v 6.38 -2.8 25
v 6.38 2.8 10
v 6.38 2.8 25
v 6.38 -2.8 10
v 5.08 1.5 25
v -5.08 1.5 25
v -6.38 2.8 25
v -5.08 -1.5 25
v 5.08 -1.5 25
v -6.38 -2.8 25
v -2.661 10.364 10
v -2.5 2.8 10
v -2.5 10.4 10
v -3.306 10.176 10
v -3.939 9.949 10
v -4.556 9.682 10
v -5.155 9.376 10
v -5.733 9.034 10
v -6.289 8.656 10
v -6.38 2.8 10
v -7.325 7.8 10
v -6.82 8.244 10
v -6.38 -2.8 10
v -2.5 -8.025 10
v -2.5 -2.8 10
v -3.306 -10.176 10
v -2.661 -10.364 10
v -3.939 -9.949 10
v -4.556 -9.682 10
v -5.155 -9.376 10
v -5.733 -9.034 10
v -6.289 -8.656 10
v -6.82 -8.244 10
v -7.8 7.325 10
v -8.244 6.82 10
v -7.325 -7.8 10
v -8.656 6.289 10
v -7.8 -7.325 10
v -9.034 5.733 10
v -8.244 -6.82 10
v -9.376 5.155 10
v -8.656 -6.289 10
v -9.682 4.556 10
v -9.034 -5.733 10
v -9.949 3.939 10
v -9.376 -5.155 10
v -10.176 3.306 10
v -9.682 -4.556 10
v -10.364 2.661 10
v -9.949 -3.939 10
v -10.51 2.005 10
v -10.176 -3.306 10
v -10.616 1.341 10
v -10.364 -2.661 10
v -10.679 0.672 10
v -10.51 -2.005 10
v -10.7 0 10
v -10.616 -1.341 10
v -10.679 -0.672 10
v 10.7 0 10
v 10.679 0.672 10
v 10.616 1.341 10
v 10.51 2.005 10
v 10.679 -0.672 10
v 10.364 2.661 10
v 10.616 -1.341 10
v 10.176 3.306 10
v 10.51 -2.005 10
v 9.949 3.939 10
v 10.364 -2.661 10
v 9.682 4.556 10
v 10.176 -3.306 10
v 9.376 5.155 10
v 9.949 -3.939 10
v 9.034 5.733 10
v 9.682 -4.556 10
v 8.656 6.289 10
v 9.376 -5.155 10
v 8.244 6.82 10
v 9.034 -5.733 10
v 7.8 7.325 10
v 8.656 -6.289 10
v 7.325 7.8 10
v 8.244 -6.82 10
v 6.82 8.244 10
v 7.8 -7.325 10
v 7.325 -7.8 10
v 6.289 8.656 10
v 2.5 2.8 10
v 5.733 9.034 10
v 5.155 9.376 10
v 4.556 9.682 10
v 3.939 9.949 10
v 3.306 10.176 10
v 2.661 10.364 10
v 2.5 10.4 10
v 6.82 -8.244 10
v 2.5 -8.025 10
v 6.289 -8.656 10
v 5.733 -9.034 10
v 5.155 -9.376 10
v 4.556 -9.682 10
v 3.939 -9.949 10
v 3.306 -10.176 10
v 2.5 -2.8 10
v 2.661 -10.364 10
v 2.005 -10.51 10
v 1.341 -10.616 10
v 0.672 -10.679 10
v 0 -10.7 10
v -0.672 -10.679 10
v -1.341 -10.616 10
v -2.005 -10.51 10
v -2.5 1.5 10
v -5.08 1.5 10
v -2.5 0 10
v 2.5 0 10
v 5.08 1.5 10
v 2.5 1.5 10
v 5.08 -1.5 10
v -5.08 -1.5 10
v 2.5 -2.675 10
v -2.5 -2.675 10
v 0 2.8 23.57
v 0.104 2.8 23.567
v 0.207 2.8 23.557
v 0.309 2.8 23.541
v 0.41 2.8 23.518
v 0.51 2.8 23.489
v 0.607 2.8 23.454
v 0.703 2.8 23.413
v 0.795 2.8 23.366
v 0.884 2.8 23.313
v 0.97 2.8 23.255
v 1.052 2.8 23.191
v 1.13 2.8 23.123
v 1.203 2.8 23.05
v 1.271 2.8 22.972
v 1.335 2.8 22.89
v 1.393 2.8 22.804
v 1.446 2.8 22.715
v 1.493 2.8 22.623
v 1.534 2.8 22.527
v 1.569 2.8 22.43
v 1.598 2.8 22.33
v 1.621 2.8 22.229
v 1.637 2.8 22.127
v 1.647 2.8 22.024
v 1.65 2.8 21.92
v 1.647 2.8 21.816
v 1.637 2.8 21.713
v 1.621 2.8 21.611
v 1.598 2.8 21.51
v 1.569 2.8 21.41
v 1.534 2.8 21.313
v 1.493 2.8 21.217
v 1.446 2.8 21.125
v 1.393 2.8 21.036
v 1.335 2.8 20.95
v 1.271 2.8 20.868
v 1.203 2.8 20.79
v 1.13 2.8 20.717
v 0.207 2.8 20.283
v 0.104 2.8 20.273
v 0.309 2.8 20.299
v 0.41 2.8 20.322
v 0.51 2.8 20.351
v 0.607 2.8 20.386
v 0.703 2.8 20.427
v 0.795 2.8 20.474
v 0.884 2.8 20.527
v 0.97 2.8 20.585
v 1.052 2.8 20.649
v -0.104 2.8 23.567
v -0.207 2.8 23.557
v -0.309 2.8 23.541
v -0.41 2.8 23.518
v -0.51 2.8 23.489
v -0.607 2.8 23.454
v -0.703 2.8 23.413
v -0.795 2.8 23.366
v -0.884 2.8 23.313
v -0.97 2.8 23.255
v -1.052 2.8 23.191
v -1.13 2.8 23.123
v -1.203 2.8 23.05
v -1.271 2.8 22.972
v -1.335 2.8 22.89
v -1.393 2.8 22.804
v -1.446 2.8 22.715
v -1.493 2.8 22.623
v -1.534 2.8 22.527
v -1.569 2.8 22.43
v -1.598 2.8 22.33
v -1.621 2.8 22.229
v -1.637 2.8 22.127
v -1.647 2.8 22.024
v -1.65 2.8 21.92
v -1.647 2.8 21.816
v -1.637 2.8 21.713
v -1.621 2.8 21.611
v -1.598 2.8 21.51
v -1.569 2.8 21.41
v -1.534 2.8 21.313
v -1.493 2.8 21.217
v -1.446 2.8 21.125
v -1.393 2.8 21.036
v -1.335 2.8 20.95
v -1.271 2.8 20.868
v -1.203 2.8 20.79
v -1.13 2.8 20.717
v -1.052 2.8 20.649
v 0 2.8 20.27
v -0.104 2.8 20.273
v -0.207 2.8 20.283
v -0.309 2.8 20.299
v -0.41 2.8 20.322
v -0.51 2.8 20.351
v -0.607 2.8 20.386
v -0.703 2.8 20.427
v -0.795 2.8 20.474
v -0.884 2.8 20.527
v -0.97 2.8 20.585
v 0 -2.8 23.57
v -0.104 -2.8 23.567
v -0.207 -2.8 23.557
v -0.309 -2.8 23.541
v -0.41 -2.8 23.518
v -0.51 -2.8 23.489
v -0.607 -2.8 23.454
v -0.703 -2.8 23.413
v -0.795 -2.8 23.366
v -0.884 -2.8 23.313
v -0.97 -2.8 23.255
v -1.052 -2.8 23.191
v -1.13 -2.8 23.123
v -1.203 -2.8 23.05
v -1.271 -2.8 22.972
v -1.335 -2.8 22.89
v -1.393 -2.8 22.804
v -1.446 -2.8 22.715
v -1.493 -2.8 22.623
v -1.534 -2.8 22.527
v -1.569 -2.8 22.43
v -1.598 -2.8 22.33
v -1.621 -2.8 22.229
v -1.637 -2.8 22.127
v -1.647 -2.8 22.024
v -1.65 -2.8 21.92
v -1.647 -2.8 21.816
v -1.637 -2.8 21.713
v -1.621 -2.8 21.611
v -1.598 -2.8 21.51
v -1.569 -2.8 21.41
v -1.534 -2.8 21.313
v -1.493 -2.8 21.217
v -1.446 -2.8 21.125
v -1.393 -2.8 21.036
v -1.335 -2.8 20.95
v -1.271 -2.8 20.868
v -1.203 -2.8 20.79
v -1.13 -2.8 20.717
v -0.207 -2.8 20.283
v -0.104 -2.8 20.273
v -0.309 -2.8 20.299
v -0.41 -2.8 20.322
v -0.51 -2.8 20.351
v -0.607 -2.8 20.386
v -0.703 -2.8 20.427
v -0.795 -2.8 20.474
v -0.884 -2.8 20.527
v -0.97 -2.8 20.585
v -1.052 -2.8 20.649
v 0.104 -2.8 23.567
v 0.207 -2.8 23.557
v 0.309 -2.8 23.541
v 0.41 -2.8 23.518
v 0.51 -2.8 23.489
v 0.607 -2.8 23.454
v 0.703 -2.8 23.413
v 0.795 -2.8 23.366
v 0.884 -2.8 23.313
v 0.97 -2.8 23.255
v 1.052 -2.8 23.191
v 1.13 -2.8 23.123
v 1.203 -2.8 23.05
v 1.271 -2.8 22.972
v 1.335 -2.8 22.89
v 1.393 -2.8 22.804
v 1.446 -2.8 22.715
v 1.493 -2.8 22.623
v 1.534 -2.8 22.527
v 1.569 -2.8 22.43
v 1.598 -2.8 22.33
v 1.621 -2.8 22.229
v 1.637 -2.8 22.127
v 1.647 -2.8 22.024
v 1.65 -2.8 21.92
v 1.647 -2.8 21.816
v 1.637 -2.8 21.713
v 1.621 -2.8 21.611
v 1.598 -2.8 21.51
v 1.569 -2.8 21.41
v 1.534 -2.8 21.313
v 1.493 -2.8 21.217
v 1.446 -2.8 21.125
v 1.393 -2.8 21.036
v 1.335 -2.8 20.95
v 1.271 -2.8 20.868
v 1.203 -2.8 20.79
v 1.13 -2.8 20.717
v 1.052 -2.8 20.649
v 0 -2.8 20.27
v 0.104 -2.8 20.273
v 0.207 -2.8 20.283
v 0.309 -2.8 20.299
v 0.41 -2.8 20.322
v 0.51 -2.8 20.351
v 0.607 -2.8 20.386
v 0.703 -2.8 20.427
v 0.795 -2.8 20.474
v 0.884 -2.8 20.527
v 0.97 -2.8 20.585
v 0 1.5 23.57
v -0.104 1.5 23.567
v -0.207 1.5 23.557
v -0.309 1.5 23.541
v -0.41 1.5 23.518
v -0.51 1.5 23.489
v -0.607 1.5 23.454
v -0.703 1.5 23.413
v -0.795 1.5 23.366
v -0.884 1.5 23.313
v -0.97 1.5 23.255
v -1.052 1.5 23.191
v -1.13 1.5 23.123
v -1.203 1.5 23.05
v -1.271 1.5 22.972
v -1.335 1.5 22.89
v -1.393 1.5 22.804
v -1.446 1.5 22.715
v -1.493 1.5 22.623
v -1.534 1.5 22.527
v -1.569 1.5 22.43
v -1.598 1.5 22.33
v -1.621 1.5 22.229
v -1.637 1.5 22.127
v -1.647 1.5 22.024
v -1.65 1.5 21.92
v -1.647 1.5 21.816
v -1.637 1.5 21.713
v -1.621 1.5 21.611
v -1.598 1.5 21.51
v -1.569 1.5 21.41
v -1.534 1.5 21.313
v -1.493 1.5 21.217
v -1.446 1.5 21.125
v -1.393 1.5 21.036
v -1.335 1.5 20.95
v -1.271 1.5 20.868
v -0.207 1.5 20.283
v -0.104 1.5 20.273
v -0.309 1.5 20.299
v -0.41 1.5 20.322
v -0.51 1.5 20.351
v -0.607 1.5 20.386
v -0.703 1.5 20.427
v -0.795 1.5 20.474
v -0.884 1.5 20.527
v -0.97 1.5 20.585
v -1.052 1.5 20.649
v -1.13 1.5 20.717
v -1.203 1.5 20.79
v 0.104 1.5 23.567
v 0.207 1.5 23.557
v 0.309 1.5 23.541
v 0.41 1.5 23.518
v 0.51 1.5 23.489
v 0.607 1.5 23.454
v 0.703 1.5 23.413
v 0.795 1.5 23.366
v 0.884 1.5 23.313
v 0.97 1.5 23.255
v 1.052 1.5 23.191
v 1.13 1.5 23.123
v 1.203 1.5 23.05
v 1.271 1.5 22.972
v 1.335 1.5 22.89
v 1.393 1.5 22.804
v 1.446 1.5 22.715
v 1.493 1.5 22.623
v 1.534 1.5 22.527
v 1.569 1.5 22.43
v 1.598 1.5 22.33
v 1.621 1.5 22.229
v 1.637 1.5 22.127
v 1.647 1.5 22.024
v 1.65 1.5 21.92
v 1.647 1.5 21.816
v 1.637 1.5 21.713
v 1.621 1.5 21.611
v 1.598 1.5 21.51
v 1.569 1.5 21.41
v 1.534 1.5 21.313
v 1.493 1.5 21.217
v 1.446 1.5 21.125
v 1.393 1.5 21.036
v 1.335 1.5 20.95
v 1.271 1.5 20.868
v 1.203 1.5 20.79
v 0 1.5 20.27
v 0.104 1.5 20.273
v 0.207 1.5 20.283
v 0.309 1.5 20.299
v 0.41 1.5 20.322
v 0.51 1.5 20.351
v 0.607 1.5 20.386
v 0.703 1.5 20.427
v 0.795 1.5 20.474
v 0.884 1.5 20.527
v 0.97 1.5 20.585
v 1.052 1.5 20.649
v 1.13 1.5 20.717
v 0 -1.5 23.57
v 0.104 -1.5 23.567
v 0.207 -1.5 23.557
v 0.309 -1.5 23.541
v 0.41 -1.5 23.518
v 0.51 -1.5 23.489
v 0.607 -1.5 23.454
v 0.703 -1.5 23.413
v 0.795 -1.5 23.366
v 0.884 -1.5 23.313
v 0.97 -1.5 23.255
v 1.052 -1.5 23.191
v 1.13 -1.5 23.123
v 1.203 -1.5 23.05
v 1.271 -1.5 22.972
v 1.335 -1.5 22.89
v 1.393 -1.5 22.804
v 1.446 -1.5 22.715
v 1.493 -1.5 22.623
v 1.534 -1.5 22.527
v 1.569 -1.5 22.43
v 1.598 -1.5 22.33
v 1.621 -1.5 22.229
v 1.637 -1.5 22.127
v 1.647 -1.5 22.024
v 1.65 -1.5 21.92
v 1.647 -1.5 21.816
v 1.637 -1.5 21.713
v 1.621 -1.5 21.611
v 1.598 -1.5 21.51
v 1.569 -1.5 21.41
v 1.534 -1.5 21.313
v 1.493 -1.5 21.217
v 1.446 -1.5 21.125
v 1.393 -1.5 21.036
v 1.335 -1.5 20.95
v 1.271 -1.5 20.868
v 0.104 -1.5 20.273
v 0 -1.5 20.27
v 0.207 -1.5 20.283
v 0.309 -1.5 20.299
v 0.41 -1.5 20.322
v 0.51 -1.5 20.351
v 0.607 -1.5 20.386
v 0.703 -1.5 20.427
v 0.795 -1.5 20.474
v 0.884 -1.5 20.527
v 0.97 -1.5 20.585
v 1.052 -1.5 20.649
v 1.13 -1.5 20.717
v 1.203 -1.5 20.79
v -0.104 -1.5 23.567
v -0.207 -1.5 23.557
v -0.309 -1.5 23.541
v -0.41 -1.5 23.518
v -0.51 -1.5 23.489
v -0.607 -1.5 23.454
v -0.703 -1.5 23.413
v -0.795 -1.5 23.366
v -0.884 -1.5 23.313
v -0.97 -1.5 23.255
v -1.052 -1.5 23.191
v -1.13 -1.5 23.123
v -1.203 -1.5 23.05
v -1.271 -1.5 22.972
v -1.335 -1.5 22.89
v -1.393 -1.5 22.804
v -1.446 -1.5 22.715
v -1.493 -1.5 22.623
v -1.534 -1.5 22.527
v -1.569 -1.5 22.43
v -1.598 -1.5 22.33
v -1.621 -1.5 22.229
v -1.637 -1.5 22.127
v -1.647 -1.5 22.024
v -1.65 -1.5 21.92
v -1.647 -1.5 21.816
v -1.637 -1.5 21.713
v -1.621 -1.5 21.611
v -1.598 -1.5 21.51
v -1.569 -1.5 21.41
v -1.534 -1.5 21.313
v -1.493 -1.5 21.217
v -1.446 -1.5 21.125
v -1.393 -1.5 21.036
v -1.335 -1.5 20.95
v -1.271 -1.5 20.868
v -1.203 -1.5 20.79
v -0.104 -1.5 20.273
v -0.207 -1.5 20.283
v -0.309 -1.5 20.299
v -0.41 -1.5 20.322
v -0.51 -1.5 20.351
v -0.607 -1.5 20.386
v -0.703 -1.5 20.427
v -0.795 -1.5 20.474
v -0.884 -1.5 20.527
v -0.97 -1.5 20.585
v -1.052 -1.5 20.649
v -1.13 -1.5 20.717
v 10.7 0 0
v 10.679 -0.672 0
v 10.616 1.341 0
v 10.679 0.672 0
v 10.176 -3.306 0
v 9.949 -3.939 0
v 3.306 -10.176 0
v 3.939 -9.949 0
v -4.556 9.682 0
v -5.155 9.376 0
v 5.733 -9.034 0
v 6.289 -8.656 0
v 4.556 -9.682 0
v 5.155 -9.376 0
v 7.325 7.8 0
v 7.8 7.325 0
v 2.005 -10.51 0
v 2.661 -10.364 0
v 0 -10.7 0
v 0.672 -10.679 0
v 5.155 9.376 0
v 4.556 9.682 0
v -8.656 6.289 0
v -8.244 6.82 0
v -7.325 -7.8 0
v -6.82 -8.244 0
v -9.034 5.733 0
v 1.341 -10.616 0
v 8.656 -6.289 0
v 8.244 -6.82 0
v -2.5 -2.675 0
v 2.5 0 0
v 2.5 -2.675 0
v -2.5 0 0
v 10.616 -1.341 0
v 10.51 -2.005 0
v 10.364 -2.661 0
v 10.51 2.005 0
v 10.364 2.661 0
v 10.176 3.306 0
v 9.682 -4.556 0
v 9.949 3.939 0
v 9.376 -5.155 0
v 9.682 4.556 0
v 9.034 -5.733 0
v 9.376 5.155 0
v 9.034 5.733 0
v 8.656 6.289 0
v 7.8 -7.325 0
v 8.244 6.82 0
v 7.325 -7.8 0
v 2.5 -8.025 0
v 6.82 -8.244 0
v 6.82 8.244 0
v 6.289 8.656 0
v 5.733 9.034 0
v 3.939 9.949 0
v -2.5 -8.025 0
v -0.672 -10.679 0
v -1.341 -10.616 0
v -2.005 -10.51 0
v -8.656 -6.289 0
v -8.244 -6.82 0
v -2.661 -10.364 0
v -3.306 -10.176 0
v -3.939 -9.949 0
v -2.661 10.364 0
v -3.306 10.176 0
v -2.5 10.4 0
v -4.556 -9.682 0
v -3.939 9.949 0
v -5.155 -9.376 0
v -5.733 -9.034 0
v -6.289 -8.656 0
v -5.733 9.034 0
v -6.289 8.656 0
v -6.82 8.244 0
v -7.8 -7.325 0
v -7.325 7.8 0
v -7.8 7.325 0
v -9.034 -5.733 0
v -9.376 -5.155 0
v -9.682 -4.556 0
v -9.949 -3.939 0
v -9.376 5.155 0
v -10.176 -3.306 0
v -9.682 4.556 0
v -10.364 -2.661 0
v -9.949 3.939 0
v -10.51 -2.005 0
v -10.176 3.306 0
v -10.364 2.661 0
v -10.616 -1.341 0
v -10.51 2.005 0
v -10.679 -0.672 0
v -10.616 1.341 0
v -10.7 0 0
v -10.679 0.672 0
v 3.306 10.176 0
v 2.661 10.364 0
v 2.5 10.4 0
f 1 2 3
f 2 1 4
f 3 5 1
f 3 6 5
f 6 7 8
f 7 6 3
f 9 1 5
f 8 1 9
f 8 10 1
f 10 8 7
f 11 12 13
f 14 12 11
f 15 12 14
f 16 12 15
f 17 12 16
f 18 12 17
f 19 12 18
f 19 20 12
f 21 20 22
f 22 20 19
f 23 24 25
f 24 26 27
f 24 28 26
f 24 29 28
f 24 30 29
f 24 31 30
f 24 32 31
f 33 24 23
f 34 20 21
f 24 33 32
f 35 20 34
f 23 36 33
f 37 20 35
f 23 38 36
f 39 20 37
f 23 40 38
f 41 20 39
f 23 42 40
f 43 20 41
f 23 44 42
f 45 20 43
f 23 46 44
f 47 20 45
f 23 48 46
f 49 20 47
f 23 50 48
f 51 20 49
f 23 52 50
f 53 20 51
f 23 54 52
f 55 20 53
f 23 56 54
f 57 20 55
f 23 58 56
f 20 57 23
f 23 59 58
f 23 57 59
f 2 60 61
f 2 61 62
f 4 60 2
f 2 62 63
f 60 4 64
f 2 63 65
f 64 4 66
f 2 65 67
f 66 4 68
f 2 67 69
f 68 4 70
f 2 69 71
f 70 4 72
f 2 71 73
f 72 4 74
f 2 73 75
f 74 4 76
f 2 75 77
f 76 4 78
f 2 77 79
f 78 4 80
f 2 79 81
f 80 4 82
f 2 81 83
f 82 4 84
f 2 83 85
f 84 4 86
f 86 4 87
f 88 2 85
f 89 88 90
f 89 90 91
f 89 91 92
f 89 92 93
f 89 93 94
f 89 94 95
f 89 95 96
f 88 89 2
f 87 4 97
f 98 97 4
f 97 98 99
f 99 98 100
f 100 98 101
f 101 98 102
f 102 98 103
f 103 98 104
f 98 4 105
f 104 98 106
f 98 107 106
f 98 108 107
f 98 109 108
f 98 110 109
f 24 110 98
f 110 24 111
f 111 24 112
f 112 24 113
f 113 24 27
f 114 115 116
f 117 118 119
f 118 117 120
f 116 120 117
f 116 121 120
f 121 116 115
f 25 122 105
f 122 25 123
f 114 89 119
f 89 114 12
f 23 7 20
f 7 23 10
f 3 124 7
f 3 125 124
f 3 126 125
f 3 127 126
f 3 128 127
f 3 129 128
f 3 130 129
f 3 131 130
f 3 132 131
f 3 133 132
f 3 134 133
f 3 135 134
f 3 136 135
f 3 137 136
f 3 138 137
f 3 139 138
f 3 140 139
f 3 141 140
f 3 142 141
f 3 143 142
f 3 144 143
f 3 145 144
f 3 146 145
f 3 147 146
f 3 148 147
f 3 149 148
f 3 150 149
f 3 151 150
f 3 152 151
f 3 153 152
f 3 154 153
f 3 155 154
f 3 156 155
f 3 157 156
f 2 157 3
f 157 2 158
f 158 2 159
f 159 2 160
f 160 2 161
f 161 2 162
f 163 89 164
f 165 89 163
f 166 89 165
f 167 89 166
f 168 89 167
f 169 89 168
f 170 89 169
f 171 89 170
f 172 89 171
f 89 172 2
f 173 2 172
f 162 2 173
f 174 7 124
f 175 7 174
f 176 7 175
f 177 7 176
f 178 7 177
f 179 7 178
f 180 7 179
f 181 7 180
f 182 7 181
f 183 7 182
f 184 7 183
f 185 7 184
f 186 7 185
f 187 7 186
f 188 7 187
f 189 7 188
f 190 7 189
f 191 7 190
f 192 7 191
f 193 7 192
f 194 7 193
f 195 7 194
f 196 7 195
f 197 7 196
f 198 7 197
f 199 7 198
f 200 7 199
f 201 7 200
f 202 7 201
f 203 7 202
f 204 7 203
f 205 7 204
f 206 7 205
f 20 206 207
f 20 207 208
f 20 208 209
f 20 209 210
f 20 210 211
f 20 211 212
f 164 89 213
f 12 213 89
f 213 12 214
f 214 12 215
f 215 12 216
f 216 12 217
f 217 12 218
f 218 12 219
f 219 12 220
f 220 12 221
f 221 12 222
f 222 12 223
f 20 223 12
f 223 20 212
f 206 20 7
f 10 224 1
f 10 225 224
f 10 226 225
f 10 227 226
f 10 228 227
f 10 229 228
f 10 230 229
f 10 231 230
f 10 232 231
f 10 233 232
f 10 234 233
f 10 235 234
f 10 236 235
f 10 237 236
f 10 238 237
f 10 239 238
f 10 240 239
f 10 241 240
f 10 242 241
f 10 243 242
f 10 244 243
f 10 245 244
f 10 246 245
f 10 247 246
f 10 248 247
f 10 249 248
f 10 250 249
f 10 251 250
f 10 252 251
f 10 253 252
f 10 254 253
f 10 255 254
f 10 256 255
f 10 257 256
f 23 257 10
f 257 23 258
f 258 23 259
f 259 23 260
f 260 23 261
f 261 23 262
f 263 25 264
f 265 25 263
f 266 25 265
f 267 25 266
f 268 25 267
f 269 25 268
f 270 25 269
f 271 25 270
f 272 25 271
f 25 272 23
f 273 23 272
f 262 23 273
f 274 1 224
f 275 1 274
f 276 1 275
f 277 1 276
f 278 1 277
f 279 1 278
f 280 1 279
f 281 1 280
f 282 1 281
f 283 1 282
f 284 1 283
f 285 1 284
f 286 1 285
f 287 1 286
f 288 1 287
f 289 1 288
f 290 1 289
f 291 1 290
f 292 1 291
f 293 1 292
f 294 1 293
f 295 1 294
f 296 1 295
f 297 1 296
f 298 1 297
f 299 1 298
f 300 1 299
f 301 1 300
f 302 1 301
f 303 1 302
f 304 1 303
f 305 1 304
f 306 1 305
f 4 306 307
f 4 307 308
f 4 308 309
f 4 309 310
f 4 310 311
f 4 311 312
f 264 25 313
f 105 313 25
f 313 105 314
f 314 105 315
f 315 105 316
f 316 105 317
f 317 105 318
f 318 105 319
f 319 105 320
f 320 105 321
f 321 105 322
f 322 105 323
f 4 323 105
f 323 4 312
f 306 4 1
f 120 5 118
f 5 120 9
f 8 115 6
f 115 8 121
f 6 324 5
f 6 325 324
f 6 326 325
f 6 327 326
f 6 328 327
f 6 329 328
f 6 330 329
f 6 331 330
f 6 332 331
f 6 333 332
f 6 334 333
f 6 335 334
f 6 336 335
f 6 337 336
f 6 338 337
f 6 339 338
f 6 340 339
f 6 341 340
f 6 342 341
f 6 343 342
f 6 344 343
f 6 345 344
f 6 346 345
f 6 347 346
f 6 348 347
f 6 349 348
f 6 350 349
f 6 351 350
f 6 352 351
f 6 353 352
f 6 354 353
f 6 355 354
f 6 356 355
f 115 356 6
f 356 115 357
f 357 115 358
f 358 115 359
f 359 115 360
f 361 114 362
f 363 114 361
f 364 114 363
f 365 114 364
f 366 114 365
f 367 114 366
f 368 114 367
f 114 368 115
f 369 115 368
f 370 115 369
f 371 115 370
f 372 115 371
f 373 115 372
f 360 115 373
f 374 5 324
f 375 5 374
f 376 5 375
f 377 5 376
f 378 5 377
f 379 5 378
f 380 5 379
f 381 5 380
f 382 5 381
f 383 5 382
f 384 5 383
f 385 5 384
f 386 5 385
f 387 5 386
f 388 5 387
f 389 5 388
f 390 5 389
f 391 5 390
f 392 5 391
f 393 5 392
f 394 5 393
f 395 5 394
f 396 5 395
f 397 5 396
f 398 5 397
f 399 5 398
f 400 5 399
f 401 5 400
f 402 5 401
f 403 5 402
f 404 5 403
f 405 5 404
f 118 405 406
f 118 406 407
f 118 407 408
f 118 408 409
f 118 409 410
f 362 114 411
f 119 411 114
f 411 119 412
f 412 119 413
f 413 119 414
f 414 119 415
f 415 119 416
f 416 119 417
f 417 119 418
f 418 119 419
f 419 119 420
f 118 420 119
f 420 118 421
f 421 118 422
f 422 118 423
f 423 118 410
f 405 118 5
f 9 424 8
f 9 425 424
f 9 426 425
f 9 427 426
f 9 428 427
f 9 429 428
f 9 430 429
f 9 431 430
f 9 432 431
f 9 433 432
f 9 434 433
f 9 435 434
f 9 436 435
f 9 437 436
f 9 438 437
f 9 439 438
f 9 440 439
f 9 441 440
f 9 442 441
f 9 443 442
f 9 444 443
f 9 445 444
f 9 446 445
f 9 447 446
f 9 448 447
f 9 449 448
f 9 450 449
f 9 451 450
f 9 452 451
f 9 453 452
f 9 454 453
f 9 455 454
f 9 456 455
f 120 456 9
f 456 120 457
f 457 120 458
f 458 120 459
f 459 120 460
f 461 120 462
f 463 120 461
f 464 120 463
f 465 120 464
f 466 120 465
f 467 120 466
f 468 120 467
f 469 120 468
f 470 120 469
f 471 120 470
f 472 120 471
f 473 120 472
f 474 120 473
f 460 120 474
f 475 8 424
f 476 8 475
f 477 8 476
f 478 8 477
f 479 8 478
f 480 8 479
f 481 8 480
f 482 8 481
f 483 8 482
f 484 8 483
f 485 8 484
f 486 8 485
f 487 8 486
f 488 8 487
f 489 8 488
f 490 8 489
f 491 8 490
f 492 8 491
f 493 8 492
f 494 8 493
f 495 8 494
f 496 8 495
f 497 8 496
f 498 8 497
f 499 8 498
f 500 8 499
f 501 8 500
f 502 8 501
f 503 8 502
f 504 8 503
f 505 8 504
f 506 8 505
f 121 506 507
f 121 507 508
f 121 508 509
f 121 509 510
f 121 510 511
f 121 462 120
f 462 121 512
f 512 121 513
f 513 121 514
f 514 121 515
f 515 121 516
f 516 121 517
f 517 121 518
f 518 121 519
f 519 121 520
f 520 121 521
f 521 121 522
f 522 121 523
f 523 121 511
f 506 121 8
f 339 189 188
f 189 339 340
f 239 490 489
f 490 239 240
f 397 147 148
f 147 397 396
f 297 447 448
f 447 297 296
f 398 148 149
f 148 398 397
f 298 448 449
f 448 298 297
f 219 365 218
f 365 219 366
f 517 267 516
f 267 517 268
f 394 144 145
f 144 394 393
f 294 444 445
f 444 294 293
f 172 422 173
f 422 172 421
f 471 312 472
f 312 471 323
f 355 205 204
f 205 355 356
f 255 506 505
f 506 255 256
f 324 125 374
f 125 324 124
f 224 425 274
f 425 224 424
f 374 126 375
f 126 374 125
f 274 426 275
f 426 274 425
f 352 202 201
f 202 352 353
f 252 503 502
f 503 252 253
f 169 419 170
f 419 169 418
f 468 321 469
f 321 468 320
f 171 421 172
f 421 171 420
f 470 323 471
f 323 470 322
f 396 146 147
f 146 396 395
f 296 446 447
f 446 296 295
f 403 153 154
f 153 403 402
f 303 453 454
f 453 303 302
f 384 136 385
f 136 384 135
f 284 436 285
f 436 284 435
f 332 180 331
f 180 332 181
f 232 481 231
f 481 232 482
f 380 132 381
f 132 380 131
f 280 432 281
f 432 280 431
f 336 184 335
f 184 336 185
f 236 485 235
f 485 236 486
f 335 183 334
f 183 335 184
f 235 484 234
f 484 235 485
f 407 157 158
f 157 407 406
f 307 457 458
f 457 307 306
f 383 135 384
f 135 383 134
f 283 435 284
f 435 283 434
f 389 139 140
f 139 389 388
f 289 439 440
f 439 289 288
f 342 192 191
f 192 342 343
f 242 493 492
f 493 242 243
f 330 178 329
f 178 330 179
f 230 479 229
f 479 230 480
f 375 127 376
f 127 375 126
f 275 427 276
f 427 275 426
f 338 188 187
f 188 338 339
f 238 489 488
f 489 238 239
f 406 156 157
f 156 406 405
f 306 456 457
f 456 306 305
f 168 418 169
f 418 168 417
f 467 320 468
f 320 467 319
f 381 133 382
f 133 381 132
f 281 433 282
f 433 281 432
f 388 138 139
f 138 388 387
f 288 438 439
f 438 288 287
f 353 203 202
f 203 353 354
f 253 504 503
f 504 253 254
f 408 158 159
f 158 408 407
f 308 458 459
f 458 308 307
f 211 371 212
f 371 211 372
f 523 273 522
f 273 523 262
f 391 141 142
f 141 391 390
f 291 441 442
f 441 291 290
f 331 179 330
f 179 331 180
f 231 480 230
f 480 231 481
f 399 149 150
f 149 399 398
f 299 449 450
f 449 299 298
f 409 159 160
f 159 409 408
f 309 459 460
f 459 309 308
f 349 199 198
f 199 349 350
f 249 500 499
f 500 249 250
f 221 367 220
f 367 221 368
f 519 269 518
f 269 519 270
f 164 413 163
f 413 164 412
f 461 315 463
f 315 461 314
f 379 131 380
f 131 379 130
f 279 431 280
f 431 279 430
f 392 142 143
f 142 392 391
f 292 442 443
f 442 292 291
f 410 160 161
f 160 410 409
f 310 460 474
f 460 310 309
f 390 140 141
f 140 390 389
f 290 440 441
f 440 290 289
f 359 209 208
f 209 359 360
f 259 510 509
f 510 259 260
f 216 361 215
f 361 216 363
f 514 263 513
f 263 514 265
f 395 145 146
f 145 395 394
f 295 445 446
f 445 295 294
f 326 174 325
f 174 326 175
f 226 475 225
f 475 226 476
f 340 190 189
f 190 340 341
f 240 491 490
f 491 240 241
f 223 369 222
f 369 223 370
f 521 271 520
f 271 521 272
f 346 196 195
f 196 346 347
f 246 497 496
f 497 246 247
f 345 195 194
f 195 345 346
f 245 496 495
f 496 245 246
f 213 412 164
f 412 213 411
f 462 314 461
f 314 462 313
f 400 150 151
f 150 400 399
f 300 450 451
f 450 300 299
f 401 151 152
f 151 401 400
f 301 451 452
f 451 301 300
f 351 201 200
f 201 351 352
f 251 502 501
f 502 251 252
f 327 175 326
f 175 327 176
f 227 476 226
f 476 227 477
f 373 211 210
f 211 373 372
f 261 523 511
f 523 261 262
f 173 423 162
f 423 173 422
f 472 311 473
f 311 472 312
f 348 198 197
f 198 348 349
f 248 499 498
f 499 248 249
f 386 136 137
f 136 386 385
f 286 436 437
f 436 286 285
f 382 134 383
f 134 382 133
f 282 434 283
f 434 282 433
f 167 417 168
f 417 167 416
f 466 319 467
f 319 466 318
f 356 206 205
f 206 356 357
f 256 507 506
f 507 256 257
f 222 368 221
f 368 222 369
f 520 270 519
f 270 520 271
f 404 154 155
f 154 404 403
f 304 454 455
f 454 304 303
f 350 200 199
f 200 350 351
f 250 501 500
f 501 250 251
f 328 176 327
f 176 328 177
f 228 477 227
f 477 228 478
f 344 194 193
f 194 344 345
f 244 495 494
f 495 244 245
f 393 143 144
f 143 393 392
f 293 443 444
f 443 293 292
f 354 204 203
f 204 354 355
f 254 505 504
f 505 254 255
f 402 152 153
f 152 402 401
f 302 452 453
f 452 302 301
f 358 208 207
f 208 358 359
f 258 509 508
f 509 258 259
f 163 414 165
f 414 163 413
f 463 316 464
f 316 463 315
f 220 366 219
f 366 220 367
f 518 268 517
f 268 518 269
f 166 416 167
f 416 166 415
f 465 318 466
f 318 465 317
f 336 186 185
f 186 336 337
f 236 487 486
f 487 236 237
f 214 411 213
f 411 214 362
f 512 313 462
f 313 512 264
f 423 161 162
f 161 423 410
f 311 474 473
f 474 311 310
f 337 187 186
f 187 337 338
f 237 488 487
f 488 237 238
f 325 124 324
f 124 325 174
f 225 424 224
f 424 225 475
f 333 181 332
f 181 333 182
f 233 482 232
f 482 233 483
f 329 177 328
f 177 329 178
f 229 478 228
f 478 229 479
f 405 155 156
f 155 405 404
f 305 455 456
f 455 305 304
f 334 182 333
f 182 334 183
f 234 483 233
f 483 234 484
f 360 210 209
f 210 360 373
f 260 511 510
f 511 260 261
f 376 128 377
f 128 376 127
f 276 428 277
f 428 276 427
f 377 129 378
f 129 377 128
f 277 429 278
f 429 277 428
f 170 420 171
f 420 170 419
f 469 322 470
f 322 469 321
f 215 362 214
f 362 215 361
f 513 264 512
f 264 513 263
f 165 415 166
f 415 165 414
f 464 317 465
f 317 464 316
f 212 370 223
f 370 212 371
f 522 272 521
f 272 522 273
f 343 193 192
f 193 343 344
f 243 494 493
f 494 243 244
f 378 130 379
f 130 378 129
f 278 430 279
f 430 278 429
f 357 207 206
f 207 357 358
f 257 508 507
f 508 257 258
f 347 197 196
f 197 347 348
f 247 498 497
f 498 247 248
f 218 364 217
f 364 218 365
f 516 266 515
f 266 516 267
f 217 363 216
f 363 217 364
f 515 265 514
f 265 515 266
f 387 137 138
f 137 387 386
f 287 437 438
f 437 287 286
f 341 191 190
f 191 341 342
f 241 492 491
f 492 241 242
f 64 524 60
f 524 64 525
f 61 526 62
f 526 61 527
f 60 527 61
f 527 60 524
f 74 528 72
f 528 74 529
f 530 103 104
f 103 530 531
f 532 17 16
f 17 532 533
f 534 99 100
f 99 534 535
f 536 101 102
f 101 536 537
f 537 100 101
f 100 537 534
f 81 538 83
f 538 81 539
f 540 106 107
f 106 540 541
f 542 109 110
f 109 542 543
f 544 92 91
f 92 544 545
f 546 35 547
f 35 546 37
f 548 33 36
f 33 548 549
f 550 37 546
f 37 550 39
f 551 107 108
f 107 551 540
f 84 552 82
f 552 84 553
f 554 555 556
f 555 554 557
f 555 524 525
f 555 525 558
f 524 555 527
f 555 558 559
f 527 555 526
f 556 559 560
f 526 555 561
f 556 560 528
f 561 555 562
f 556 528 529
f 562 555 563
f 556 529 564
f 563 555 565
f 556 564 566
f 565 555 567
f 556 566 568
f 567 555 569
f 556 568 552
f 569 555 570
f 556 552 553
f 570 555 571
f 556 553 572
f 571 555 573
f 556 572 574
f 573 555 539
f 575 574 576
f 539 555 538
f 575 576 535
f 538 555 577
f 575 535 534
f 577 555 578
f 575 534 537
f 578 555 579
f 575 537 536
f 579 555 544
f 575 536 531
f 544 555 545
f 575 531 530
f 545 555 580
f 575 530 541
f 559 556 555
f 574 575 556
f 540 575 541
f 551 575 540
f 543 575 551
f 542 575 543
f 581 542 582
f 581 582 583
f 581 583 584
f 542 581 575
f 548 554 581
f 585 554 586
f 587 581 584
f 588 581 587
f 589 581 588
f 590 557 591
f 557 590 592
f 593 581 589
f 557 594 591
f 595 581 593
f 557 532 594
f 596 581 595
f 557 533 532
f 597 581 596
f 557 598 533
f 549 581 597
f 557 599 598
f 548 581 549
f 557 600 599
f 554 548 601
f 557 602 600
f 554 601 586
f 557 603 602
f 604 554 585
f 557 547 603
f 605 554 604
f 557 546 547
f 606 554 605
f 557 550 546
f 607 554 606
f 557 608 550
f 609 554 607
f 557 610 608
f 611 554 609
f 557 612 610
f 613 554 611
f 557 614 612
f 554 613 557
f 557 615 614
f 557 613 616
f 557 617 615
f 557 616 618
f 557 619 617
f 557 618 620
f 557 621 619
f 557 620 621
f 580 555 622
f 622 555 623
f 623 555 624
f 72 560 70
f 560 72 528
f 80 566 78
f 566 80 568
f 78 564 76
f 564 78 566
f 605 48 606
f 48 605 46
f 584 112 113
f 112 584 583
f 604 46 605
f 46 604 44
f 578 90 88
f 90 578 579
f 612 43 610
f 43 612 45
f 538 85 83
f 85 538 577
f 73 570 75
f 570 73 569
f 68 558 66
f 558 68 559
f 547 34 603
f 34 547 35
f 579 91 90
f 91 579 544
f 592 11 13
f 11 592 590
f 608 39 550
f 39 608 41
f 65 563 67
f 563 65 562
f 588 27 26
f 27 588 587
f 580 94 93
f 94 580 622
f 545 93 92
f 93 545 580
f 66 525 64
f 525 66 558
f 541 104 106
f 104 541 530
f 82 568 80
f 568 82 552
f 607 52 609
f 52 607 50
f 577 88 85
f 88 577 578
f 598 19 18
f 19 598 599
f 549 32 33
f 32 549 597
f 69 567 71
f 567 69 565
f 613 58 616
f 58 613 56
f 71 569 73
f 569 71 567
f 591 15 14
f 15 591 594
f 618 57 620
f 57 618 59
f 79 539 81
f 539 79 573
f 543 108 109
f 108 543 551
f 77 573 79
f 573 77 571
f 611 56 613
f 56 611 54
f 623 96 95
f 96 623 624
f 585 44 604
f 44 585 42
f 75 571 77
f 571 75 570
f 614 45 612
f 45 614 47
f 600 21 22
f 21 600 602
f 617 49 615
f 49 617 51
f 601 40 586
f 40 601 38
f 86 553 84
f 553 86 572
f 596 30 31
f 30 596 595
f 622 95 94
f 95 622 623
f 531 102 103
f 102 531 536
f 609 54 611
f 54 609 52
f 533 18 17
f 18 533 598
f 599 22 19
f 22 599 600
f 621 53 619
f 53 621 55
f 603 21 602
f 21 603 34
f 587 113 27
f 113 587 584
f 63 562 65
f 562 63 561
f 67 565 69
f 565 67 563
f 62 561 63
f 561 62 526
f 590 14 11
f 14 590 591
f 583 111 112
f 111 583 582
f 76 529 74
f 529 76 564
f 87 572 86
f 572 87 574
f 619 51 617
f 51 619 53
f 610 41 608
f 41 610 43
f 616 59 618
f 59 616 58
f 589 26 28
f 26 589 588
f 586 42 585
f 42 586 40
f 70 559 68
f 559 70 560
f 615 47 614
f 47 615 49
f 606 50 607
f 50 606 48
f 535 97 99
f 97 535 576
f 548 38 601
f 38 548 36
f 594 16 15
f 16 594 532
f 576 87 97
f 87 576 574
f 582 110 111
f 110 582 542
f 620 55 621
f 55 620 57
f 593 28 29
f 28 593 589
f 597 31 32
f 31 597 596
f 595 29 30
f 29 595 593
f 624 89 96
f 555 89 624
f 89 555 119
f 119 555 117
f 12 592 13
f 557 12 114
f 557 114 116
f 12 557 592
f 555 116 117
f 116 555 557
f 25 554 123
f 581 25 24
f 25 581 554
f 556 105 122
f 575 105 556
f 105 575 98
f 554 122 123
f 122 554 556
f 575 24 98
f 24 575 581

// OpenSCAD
// file: ../configuration.scad
$fn=40; // model faces resolution.

//Parametry pro D01 a D02
//nastavení držáku na sloup
//Parametry pro D5
//----------------------------------------------------------------
//----------------------------------------------------------------


S01_sila_materialu=1.3; //sila výztuhy

//D01 - uchyt velky
D01_material_pod_zavitem=5;
D01_material_za_zavitem=3;
D01_material_pred_zavitem=2;
D01_delka_tyce=30;
D01_sirka_tyce=15;

//D02 - uchyt na sloup
D02_sila_materialu=5;
D02_vyska_uchytky=40;
D02_prumer_obruby=27; 
//27mm - 3/4 trubka
D02_delka_celeho_uchytu=64;
D02_dotahova_vzdalenost=1.5;
D02_prumer_uchytneho_sroubu=4.2;
D02_sirka_matky=9.1; //pro M4
D02_vyska_matky=3;


D05_vyska_drzaku_senzoru=15;
D05_prumer_zkumavky_vnitrni=21.4;
D05_vyska_podstavce=10;
D05_sirka_otvoru_na_kabel=5;




//není potřeba měnit
S01_prumer_vnitrni=40;
S01_tolerance_zavit=1.5;
// file: ../SRC/ISLHOLDER01A_D05.scad
$fn=40; // model faces resolution.
include <../configuration.scad>


//Drzak senzoru
module ISLHOLDER01A_D05()
    {
    translate([0,0,(D05_vyska_drzaku_senzoru)/2+D05_vyska_podstavce])
        difference()
            {
            cube([10.16+2*S01_sila_materialu,3+2*S01_sila_materialu,D05_vyska_drzaku_senzoru],true);

            cube([10.16,3,D05_vyska_drzaku_senzoru+0.01],true);
            
            translate([0,5,D05_vyska_drzaku_senzoru/2-3.08])
                rotate ([90,0,0])
                    cylinder (h = 30, r=(3.3/2), $fn=100);
            
            }
            
   difference()
        {         
        cylinder (h = D05_vyska_podstavce, r=D05_prumer_zkumavky_vnitrni/2, $fn=100);
        
        translate([0,D05_prumer_zkumavky_vnitrni/4,D05_vyska_podstavce/2])  
            cube([D05_sirka_otvoru_na_kabel,D05_prumer_zkumavky_vnitrni/2,D05_vyska_podstavce+0.11],true); 
         
          rotate ([0,0,180])   
         translate([0,D05_prumer_zkumavky_vnitrni*1/4,D05_vyska_podstavce/2])  
            cube([D05_sirka_otvoru_na_kabel,D05_prumer_zkumavky_vnitrni/4,D05_vyska_podstavce+0.11],true);     
            
       }
    }

ISLHOLDER01A_D05();
// file: ../configuration2.scad
$fn=40; // model faces resolution.

//Parametry pro D03 a D04
//Nastavení držáku zkumavky
//----------------------------------------------------------------
//----------------------------------------------------------------
//není potřeba měnit
S01_prumer_vnitrni=40;
S01_tolerance_zavit=1.5;

S01_sila_materialu=1.3; //sila výtuhy

//D03 - uchyt velky
D01_material_pod_zavitem=5;
D01_material_za_zavitem=3;
D01_material_pred_zavitem=2;
D01_delka_tyce=20;
D01_sirka_tyce=15;

//D04 - uchyt na sloup
D02_sila_materialu=5;
D02_vyska_uchytky=30;
D02_prumer_obruby=25; //pruměr zkumavky
D02_delka_celeho_uchytu=60;
D02_dotahova_vzdalenost=1.5;
D02_prumer_uchytneho_sroubu=4.2;
D02_sirka_matky=9.1; //pro M4
D02_vyska_matky=3;
// main file
$fn=100; // model faces resolution.
include <../configuration2.scad>
use <../SRC/ISLHOLDER01A_D05.scad>

rotate([0, 0, 0])
    translate([0,0,0])
        ISLHOLDER01A_D05();

            
